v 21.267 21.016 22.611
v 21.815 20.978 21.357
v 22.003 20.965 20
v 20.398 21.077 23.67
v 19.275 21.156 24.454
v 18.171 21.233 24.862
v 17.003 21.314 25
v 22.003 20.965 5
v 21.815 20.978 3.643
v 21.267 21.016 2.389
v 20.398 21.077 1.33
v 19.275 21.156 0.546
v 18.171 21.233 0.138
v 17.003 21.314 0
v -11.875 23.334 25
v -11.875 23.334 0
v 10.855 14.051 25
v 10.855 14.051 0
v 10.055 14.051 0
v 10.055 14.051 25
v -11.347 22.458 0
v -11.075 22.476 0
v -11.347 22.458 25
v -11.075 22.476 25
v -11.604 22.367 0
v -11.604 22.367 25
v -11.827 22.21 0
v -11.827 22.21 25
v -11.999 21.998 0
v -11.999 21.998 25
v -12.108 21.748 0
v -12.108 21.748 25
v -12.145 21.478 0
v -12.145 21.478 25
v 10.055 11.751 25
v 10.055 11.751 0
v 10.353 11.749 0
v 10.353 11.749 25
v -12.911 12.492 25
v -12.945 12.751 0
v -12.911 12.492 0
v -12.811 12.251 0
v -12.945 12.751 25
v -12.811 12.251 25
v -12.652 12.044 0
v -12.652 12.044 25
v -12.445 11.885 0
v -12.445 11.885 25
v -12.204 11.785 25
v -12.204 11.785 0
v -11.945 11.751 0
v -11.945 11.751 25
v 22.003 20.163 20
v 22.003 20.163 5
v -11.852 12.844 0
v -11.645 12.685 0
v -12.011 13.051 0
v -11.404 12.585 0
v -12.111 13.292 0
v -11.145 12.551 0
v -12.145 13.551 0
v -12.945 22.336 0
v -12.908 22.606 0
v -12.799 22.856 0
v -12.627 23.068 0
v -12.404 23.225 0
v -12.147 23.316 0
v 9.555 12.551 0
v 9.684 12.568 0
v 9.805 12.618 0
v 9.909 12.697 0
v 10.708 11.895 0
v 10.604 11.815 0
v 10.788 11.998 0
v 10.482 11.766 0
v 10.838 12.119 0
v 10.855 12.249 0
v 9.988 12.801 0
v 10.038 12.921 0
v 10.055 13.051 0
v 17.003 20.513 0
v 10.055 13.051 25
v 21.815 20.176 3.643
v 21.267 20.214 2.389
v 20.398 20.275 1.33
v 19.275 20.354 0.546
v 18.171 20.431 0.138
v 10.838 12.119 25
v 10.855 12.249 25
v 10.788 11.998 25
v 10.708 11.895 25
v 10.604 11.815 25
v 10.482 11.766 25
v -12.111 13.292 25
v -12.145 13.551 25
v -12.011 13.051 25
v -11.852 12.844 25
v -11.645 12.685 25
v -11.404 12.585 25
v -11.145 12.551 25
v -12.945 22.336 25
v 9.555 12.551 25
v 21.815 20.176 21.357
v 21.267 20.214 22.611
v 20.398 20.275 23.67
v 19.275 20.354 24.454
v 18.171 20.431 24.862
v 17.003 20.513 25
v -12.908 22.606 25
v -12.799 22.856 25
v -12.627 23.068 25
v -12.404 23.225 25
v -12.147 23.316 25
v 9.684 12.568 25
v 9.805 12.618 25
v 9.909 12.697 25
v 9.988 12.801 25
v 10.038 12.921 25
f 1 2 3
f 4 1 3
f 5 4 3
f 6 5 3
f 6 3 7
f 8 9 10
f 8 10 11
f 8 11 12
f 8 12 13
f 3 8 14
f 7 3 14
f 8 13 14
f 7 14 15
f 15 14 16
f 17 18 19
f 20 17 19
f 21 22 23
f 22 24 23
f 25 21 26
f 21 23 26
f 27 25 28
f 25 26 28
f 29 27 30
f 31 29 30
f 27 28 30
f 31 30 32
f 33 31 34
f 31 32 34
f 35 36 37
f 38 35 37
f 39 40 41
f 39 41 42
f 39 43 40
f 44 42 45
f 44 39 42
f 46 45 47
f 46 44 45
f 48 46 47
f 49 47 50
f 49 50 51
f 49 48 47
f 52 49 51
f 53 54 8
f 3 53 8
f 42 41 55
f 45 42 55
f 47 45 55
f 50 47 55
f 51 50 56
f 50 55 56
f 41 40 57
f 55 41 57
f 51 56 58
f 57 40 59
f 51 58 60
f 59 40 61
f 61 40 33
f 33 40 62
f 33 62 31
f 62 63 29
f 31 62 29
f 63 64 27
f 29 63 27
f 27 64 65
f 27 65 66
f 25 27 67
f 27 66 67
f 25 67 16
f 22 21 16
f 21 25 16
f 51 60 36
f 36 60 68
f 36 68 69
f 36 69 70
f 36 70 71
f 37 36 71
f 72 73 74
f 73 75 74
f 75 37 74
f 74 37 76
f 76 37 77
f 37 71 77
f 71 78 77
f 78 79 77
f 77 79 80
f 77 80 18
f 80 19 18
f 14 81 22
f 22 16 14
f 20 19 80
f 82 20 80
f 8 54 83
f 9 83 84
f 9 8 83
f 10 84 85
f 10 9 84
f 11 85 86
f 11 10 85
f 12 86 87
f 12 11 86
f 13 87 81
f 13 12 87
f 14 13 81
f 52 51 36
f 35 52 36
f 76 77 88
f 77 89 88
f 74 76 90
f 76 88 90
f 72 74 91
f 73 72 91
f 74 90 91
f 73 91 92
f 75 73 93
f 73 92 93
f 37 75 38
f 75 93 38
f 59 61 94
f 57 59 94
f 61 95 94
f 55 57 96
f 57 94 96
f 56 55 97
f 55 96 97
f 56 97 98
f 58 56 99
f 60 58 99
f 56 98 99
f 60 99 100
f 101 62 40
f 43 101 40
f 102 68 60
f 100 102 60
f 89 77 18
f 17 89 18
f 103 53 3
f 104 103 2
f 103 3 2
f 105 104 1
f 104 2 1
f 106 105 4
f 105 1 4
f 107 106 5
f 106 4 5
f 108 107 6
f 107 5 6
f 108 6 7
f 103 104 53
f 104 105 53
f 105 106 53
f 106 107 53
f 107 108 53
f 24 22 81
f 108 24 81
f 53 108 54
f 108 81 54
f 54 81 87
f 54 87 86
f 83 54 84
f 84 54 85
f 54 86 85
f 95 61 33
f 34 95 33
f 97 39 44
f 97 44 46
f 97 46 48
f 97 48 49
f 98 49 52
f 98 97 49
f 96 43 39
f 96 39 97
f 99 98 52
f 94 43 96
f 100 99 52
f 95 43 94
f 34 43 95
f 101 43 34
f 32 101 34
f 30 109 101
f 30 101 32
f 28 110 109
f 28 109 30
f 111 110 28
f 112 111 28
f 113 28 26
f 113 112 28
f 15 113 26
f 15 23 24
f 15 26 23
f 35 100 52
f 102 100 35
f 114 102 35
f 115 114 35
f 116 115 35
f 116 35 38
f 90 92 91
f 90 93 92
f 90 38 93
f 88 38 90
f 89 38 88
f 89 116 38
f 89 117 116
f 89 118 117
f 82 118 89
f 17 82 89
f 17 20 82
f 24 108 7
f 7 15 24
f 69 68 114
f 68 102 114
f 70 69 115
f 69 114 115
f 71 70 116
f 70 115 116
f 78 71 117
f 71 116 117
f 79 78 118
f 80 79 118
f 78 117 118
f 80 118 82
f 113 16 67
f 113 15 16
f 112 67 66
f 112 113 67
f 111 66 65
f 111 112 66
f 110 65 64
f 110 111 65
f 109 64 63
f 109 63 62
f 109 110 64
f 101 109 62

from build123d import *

# Parameters (mm, degrees)
F1_DEPTH = 25
F2_R     = 5
F3_R     = 1
F4_R     = 0.5


# Not quite as in the source:
# - a feature names something its author has since deleted; it is built from what else it names


with BuildPart() as f1:
    # F0 (on Top) → F1 (new body)
    with BuildSketch(Plane.XY):
        Polygon((-12.9449461493, 23.2145217315), (-12.9449461493, 11.7507396201), (10.0550538507, 11.7507396201), (10.8550538507, 11.7466916821), (10.8550538507, 14.0507396201), (10.0550538507, 14.0507396201), (10.0550538507, 12.5507396201), (-12.1449461493, 12.5507396201), (-12.1449461493, 22.5507396201), (22.0030346708, 20.162880187), (22.0030346708, 20.9648337055), (-12.9449461493, 23.4086345881), align=None)
    extrude(amount=F1_DEPTH)

    # F2
    f2_edges = [f1.edges().sort_by_distance(p)[0] for p in [
        (22.003035, 20.563857, 25),
        (22.003035, 20.563857, 0),
    ]]
    fillet(f2_edges, radius=F2_R)

    # F3
    f3_edges = [f1.edges().sort_by_distance(p)[0] for p in [
        (-12.944946, 11.75074, 12.5),
        (-12.144946, 12.55074, 12.5),
        (-12.944946, 23.408635, 12.5),
        (-12.144946, 22.55074, 12.5),
    ]]
    fillet(f3_edges, radius=F3_R)

    # F4
    f4_edges = [f1.edges().sort_by_distance(p)[0] for p in [
        (10.855054, 11.746692, 12.5),
        (10.055054, 12.55074, 12.5),
    ]]
    fillet(f4_edges, radius=F4_R)


solid = f1.part
